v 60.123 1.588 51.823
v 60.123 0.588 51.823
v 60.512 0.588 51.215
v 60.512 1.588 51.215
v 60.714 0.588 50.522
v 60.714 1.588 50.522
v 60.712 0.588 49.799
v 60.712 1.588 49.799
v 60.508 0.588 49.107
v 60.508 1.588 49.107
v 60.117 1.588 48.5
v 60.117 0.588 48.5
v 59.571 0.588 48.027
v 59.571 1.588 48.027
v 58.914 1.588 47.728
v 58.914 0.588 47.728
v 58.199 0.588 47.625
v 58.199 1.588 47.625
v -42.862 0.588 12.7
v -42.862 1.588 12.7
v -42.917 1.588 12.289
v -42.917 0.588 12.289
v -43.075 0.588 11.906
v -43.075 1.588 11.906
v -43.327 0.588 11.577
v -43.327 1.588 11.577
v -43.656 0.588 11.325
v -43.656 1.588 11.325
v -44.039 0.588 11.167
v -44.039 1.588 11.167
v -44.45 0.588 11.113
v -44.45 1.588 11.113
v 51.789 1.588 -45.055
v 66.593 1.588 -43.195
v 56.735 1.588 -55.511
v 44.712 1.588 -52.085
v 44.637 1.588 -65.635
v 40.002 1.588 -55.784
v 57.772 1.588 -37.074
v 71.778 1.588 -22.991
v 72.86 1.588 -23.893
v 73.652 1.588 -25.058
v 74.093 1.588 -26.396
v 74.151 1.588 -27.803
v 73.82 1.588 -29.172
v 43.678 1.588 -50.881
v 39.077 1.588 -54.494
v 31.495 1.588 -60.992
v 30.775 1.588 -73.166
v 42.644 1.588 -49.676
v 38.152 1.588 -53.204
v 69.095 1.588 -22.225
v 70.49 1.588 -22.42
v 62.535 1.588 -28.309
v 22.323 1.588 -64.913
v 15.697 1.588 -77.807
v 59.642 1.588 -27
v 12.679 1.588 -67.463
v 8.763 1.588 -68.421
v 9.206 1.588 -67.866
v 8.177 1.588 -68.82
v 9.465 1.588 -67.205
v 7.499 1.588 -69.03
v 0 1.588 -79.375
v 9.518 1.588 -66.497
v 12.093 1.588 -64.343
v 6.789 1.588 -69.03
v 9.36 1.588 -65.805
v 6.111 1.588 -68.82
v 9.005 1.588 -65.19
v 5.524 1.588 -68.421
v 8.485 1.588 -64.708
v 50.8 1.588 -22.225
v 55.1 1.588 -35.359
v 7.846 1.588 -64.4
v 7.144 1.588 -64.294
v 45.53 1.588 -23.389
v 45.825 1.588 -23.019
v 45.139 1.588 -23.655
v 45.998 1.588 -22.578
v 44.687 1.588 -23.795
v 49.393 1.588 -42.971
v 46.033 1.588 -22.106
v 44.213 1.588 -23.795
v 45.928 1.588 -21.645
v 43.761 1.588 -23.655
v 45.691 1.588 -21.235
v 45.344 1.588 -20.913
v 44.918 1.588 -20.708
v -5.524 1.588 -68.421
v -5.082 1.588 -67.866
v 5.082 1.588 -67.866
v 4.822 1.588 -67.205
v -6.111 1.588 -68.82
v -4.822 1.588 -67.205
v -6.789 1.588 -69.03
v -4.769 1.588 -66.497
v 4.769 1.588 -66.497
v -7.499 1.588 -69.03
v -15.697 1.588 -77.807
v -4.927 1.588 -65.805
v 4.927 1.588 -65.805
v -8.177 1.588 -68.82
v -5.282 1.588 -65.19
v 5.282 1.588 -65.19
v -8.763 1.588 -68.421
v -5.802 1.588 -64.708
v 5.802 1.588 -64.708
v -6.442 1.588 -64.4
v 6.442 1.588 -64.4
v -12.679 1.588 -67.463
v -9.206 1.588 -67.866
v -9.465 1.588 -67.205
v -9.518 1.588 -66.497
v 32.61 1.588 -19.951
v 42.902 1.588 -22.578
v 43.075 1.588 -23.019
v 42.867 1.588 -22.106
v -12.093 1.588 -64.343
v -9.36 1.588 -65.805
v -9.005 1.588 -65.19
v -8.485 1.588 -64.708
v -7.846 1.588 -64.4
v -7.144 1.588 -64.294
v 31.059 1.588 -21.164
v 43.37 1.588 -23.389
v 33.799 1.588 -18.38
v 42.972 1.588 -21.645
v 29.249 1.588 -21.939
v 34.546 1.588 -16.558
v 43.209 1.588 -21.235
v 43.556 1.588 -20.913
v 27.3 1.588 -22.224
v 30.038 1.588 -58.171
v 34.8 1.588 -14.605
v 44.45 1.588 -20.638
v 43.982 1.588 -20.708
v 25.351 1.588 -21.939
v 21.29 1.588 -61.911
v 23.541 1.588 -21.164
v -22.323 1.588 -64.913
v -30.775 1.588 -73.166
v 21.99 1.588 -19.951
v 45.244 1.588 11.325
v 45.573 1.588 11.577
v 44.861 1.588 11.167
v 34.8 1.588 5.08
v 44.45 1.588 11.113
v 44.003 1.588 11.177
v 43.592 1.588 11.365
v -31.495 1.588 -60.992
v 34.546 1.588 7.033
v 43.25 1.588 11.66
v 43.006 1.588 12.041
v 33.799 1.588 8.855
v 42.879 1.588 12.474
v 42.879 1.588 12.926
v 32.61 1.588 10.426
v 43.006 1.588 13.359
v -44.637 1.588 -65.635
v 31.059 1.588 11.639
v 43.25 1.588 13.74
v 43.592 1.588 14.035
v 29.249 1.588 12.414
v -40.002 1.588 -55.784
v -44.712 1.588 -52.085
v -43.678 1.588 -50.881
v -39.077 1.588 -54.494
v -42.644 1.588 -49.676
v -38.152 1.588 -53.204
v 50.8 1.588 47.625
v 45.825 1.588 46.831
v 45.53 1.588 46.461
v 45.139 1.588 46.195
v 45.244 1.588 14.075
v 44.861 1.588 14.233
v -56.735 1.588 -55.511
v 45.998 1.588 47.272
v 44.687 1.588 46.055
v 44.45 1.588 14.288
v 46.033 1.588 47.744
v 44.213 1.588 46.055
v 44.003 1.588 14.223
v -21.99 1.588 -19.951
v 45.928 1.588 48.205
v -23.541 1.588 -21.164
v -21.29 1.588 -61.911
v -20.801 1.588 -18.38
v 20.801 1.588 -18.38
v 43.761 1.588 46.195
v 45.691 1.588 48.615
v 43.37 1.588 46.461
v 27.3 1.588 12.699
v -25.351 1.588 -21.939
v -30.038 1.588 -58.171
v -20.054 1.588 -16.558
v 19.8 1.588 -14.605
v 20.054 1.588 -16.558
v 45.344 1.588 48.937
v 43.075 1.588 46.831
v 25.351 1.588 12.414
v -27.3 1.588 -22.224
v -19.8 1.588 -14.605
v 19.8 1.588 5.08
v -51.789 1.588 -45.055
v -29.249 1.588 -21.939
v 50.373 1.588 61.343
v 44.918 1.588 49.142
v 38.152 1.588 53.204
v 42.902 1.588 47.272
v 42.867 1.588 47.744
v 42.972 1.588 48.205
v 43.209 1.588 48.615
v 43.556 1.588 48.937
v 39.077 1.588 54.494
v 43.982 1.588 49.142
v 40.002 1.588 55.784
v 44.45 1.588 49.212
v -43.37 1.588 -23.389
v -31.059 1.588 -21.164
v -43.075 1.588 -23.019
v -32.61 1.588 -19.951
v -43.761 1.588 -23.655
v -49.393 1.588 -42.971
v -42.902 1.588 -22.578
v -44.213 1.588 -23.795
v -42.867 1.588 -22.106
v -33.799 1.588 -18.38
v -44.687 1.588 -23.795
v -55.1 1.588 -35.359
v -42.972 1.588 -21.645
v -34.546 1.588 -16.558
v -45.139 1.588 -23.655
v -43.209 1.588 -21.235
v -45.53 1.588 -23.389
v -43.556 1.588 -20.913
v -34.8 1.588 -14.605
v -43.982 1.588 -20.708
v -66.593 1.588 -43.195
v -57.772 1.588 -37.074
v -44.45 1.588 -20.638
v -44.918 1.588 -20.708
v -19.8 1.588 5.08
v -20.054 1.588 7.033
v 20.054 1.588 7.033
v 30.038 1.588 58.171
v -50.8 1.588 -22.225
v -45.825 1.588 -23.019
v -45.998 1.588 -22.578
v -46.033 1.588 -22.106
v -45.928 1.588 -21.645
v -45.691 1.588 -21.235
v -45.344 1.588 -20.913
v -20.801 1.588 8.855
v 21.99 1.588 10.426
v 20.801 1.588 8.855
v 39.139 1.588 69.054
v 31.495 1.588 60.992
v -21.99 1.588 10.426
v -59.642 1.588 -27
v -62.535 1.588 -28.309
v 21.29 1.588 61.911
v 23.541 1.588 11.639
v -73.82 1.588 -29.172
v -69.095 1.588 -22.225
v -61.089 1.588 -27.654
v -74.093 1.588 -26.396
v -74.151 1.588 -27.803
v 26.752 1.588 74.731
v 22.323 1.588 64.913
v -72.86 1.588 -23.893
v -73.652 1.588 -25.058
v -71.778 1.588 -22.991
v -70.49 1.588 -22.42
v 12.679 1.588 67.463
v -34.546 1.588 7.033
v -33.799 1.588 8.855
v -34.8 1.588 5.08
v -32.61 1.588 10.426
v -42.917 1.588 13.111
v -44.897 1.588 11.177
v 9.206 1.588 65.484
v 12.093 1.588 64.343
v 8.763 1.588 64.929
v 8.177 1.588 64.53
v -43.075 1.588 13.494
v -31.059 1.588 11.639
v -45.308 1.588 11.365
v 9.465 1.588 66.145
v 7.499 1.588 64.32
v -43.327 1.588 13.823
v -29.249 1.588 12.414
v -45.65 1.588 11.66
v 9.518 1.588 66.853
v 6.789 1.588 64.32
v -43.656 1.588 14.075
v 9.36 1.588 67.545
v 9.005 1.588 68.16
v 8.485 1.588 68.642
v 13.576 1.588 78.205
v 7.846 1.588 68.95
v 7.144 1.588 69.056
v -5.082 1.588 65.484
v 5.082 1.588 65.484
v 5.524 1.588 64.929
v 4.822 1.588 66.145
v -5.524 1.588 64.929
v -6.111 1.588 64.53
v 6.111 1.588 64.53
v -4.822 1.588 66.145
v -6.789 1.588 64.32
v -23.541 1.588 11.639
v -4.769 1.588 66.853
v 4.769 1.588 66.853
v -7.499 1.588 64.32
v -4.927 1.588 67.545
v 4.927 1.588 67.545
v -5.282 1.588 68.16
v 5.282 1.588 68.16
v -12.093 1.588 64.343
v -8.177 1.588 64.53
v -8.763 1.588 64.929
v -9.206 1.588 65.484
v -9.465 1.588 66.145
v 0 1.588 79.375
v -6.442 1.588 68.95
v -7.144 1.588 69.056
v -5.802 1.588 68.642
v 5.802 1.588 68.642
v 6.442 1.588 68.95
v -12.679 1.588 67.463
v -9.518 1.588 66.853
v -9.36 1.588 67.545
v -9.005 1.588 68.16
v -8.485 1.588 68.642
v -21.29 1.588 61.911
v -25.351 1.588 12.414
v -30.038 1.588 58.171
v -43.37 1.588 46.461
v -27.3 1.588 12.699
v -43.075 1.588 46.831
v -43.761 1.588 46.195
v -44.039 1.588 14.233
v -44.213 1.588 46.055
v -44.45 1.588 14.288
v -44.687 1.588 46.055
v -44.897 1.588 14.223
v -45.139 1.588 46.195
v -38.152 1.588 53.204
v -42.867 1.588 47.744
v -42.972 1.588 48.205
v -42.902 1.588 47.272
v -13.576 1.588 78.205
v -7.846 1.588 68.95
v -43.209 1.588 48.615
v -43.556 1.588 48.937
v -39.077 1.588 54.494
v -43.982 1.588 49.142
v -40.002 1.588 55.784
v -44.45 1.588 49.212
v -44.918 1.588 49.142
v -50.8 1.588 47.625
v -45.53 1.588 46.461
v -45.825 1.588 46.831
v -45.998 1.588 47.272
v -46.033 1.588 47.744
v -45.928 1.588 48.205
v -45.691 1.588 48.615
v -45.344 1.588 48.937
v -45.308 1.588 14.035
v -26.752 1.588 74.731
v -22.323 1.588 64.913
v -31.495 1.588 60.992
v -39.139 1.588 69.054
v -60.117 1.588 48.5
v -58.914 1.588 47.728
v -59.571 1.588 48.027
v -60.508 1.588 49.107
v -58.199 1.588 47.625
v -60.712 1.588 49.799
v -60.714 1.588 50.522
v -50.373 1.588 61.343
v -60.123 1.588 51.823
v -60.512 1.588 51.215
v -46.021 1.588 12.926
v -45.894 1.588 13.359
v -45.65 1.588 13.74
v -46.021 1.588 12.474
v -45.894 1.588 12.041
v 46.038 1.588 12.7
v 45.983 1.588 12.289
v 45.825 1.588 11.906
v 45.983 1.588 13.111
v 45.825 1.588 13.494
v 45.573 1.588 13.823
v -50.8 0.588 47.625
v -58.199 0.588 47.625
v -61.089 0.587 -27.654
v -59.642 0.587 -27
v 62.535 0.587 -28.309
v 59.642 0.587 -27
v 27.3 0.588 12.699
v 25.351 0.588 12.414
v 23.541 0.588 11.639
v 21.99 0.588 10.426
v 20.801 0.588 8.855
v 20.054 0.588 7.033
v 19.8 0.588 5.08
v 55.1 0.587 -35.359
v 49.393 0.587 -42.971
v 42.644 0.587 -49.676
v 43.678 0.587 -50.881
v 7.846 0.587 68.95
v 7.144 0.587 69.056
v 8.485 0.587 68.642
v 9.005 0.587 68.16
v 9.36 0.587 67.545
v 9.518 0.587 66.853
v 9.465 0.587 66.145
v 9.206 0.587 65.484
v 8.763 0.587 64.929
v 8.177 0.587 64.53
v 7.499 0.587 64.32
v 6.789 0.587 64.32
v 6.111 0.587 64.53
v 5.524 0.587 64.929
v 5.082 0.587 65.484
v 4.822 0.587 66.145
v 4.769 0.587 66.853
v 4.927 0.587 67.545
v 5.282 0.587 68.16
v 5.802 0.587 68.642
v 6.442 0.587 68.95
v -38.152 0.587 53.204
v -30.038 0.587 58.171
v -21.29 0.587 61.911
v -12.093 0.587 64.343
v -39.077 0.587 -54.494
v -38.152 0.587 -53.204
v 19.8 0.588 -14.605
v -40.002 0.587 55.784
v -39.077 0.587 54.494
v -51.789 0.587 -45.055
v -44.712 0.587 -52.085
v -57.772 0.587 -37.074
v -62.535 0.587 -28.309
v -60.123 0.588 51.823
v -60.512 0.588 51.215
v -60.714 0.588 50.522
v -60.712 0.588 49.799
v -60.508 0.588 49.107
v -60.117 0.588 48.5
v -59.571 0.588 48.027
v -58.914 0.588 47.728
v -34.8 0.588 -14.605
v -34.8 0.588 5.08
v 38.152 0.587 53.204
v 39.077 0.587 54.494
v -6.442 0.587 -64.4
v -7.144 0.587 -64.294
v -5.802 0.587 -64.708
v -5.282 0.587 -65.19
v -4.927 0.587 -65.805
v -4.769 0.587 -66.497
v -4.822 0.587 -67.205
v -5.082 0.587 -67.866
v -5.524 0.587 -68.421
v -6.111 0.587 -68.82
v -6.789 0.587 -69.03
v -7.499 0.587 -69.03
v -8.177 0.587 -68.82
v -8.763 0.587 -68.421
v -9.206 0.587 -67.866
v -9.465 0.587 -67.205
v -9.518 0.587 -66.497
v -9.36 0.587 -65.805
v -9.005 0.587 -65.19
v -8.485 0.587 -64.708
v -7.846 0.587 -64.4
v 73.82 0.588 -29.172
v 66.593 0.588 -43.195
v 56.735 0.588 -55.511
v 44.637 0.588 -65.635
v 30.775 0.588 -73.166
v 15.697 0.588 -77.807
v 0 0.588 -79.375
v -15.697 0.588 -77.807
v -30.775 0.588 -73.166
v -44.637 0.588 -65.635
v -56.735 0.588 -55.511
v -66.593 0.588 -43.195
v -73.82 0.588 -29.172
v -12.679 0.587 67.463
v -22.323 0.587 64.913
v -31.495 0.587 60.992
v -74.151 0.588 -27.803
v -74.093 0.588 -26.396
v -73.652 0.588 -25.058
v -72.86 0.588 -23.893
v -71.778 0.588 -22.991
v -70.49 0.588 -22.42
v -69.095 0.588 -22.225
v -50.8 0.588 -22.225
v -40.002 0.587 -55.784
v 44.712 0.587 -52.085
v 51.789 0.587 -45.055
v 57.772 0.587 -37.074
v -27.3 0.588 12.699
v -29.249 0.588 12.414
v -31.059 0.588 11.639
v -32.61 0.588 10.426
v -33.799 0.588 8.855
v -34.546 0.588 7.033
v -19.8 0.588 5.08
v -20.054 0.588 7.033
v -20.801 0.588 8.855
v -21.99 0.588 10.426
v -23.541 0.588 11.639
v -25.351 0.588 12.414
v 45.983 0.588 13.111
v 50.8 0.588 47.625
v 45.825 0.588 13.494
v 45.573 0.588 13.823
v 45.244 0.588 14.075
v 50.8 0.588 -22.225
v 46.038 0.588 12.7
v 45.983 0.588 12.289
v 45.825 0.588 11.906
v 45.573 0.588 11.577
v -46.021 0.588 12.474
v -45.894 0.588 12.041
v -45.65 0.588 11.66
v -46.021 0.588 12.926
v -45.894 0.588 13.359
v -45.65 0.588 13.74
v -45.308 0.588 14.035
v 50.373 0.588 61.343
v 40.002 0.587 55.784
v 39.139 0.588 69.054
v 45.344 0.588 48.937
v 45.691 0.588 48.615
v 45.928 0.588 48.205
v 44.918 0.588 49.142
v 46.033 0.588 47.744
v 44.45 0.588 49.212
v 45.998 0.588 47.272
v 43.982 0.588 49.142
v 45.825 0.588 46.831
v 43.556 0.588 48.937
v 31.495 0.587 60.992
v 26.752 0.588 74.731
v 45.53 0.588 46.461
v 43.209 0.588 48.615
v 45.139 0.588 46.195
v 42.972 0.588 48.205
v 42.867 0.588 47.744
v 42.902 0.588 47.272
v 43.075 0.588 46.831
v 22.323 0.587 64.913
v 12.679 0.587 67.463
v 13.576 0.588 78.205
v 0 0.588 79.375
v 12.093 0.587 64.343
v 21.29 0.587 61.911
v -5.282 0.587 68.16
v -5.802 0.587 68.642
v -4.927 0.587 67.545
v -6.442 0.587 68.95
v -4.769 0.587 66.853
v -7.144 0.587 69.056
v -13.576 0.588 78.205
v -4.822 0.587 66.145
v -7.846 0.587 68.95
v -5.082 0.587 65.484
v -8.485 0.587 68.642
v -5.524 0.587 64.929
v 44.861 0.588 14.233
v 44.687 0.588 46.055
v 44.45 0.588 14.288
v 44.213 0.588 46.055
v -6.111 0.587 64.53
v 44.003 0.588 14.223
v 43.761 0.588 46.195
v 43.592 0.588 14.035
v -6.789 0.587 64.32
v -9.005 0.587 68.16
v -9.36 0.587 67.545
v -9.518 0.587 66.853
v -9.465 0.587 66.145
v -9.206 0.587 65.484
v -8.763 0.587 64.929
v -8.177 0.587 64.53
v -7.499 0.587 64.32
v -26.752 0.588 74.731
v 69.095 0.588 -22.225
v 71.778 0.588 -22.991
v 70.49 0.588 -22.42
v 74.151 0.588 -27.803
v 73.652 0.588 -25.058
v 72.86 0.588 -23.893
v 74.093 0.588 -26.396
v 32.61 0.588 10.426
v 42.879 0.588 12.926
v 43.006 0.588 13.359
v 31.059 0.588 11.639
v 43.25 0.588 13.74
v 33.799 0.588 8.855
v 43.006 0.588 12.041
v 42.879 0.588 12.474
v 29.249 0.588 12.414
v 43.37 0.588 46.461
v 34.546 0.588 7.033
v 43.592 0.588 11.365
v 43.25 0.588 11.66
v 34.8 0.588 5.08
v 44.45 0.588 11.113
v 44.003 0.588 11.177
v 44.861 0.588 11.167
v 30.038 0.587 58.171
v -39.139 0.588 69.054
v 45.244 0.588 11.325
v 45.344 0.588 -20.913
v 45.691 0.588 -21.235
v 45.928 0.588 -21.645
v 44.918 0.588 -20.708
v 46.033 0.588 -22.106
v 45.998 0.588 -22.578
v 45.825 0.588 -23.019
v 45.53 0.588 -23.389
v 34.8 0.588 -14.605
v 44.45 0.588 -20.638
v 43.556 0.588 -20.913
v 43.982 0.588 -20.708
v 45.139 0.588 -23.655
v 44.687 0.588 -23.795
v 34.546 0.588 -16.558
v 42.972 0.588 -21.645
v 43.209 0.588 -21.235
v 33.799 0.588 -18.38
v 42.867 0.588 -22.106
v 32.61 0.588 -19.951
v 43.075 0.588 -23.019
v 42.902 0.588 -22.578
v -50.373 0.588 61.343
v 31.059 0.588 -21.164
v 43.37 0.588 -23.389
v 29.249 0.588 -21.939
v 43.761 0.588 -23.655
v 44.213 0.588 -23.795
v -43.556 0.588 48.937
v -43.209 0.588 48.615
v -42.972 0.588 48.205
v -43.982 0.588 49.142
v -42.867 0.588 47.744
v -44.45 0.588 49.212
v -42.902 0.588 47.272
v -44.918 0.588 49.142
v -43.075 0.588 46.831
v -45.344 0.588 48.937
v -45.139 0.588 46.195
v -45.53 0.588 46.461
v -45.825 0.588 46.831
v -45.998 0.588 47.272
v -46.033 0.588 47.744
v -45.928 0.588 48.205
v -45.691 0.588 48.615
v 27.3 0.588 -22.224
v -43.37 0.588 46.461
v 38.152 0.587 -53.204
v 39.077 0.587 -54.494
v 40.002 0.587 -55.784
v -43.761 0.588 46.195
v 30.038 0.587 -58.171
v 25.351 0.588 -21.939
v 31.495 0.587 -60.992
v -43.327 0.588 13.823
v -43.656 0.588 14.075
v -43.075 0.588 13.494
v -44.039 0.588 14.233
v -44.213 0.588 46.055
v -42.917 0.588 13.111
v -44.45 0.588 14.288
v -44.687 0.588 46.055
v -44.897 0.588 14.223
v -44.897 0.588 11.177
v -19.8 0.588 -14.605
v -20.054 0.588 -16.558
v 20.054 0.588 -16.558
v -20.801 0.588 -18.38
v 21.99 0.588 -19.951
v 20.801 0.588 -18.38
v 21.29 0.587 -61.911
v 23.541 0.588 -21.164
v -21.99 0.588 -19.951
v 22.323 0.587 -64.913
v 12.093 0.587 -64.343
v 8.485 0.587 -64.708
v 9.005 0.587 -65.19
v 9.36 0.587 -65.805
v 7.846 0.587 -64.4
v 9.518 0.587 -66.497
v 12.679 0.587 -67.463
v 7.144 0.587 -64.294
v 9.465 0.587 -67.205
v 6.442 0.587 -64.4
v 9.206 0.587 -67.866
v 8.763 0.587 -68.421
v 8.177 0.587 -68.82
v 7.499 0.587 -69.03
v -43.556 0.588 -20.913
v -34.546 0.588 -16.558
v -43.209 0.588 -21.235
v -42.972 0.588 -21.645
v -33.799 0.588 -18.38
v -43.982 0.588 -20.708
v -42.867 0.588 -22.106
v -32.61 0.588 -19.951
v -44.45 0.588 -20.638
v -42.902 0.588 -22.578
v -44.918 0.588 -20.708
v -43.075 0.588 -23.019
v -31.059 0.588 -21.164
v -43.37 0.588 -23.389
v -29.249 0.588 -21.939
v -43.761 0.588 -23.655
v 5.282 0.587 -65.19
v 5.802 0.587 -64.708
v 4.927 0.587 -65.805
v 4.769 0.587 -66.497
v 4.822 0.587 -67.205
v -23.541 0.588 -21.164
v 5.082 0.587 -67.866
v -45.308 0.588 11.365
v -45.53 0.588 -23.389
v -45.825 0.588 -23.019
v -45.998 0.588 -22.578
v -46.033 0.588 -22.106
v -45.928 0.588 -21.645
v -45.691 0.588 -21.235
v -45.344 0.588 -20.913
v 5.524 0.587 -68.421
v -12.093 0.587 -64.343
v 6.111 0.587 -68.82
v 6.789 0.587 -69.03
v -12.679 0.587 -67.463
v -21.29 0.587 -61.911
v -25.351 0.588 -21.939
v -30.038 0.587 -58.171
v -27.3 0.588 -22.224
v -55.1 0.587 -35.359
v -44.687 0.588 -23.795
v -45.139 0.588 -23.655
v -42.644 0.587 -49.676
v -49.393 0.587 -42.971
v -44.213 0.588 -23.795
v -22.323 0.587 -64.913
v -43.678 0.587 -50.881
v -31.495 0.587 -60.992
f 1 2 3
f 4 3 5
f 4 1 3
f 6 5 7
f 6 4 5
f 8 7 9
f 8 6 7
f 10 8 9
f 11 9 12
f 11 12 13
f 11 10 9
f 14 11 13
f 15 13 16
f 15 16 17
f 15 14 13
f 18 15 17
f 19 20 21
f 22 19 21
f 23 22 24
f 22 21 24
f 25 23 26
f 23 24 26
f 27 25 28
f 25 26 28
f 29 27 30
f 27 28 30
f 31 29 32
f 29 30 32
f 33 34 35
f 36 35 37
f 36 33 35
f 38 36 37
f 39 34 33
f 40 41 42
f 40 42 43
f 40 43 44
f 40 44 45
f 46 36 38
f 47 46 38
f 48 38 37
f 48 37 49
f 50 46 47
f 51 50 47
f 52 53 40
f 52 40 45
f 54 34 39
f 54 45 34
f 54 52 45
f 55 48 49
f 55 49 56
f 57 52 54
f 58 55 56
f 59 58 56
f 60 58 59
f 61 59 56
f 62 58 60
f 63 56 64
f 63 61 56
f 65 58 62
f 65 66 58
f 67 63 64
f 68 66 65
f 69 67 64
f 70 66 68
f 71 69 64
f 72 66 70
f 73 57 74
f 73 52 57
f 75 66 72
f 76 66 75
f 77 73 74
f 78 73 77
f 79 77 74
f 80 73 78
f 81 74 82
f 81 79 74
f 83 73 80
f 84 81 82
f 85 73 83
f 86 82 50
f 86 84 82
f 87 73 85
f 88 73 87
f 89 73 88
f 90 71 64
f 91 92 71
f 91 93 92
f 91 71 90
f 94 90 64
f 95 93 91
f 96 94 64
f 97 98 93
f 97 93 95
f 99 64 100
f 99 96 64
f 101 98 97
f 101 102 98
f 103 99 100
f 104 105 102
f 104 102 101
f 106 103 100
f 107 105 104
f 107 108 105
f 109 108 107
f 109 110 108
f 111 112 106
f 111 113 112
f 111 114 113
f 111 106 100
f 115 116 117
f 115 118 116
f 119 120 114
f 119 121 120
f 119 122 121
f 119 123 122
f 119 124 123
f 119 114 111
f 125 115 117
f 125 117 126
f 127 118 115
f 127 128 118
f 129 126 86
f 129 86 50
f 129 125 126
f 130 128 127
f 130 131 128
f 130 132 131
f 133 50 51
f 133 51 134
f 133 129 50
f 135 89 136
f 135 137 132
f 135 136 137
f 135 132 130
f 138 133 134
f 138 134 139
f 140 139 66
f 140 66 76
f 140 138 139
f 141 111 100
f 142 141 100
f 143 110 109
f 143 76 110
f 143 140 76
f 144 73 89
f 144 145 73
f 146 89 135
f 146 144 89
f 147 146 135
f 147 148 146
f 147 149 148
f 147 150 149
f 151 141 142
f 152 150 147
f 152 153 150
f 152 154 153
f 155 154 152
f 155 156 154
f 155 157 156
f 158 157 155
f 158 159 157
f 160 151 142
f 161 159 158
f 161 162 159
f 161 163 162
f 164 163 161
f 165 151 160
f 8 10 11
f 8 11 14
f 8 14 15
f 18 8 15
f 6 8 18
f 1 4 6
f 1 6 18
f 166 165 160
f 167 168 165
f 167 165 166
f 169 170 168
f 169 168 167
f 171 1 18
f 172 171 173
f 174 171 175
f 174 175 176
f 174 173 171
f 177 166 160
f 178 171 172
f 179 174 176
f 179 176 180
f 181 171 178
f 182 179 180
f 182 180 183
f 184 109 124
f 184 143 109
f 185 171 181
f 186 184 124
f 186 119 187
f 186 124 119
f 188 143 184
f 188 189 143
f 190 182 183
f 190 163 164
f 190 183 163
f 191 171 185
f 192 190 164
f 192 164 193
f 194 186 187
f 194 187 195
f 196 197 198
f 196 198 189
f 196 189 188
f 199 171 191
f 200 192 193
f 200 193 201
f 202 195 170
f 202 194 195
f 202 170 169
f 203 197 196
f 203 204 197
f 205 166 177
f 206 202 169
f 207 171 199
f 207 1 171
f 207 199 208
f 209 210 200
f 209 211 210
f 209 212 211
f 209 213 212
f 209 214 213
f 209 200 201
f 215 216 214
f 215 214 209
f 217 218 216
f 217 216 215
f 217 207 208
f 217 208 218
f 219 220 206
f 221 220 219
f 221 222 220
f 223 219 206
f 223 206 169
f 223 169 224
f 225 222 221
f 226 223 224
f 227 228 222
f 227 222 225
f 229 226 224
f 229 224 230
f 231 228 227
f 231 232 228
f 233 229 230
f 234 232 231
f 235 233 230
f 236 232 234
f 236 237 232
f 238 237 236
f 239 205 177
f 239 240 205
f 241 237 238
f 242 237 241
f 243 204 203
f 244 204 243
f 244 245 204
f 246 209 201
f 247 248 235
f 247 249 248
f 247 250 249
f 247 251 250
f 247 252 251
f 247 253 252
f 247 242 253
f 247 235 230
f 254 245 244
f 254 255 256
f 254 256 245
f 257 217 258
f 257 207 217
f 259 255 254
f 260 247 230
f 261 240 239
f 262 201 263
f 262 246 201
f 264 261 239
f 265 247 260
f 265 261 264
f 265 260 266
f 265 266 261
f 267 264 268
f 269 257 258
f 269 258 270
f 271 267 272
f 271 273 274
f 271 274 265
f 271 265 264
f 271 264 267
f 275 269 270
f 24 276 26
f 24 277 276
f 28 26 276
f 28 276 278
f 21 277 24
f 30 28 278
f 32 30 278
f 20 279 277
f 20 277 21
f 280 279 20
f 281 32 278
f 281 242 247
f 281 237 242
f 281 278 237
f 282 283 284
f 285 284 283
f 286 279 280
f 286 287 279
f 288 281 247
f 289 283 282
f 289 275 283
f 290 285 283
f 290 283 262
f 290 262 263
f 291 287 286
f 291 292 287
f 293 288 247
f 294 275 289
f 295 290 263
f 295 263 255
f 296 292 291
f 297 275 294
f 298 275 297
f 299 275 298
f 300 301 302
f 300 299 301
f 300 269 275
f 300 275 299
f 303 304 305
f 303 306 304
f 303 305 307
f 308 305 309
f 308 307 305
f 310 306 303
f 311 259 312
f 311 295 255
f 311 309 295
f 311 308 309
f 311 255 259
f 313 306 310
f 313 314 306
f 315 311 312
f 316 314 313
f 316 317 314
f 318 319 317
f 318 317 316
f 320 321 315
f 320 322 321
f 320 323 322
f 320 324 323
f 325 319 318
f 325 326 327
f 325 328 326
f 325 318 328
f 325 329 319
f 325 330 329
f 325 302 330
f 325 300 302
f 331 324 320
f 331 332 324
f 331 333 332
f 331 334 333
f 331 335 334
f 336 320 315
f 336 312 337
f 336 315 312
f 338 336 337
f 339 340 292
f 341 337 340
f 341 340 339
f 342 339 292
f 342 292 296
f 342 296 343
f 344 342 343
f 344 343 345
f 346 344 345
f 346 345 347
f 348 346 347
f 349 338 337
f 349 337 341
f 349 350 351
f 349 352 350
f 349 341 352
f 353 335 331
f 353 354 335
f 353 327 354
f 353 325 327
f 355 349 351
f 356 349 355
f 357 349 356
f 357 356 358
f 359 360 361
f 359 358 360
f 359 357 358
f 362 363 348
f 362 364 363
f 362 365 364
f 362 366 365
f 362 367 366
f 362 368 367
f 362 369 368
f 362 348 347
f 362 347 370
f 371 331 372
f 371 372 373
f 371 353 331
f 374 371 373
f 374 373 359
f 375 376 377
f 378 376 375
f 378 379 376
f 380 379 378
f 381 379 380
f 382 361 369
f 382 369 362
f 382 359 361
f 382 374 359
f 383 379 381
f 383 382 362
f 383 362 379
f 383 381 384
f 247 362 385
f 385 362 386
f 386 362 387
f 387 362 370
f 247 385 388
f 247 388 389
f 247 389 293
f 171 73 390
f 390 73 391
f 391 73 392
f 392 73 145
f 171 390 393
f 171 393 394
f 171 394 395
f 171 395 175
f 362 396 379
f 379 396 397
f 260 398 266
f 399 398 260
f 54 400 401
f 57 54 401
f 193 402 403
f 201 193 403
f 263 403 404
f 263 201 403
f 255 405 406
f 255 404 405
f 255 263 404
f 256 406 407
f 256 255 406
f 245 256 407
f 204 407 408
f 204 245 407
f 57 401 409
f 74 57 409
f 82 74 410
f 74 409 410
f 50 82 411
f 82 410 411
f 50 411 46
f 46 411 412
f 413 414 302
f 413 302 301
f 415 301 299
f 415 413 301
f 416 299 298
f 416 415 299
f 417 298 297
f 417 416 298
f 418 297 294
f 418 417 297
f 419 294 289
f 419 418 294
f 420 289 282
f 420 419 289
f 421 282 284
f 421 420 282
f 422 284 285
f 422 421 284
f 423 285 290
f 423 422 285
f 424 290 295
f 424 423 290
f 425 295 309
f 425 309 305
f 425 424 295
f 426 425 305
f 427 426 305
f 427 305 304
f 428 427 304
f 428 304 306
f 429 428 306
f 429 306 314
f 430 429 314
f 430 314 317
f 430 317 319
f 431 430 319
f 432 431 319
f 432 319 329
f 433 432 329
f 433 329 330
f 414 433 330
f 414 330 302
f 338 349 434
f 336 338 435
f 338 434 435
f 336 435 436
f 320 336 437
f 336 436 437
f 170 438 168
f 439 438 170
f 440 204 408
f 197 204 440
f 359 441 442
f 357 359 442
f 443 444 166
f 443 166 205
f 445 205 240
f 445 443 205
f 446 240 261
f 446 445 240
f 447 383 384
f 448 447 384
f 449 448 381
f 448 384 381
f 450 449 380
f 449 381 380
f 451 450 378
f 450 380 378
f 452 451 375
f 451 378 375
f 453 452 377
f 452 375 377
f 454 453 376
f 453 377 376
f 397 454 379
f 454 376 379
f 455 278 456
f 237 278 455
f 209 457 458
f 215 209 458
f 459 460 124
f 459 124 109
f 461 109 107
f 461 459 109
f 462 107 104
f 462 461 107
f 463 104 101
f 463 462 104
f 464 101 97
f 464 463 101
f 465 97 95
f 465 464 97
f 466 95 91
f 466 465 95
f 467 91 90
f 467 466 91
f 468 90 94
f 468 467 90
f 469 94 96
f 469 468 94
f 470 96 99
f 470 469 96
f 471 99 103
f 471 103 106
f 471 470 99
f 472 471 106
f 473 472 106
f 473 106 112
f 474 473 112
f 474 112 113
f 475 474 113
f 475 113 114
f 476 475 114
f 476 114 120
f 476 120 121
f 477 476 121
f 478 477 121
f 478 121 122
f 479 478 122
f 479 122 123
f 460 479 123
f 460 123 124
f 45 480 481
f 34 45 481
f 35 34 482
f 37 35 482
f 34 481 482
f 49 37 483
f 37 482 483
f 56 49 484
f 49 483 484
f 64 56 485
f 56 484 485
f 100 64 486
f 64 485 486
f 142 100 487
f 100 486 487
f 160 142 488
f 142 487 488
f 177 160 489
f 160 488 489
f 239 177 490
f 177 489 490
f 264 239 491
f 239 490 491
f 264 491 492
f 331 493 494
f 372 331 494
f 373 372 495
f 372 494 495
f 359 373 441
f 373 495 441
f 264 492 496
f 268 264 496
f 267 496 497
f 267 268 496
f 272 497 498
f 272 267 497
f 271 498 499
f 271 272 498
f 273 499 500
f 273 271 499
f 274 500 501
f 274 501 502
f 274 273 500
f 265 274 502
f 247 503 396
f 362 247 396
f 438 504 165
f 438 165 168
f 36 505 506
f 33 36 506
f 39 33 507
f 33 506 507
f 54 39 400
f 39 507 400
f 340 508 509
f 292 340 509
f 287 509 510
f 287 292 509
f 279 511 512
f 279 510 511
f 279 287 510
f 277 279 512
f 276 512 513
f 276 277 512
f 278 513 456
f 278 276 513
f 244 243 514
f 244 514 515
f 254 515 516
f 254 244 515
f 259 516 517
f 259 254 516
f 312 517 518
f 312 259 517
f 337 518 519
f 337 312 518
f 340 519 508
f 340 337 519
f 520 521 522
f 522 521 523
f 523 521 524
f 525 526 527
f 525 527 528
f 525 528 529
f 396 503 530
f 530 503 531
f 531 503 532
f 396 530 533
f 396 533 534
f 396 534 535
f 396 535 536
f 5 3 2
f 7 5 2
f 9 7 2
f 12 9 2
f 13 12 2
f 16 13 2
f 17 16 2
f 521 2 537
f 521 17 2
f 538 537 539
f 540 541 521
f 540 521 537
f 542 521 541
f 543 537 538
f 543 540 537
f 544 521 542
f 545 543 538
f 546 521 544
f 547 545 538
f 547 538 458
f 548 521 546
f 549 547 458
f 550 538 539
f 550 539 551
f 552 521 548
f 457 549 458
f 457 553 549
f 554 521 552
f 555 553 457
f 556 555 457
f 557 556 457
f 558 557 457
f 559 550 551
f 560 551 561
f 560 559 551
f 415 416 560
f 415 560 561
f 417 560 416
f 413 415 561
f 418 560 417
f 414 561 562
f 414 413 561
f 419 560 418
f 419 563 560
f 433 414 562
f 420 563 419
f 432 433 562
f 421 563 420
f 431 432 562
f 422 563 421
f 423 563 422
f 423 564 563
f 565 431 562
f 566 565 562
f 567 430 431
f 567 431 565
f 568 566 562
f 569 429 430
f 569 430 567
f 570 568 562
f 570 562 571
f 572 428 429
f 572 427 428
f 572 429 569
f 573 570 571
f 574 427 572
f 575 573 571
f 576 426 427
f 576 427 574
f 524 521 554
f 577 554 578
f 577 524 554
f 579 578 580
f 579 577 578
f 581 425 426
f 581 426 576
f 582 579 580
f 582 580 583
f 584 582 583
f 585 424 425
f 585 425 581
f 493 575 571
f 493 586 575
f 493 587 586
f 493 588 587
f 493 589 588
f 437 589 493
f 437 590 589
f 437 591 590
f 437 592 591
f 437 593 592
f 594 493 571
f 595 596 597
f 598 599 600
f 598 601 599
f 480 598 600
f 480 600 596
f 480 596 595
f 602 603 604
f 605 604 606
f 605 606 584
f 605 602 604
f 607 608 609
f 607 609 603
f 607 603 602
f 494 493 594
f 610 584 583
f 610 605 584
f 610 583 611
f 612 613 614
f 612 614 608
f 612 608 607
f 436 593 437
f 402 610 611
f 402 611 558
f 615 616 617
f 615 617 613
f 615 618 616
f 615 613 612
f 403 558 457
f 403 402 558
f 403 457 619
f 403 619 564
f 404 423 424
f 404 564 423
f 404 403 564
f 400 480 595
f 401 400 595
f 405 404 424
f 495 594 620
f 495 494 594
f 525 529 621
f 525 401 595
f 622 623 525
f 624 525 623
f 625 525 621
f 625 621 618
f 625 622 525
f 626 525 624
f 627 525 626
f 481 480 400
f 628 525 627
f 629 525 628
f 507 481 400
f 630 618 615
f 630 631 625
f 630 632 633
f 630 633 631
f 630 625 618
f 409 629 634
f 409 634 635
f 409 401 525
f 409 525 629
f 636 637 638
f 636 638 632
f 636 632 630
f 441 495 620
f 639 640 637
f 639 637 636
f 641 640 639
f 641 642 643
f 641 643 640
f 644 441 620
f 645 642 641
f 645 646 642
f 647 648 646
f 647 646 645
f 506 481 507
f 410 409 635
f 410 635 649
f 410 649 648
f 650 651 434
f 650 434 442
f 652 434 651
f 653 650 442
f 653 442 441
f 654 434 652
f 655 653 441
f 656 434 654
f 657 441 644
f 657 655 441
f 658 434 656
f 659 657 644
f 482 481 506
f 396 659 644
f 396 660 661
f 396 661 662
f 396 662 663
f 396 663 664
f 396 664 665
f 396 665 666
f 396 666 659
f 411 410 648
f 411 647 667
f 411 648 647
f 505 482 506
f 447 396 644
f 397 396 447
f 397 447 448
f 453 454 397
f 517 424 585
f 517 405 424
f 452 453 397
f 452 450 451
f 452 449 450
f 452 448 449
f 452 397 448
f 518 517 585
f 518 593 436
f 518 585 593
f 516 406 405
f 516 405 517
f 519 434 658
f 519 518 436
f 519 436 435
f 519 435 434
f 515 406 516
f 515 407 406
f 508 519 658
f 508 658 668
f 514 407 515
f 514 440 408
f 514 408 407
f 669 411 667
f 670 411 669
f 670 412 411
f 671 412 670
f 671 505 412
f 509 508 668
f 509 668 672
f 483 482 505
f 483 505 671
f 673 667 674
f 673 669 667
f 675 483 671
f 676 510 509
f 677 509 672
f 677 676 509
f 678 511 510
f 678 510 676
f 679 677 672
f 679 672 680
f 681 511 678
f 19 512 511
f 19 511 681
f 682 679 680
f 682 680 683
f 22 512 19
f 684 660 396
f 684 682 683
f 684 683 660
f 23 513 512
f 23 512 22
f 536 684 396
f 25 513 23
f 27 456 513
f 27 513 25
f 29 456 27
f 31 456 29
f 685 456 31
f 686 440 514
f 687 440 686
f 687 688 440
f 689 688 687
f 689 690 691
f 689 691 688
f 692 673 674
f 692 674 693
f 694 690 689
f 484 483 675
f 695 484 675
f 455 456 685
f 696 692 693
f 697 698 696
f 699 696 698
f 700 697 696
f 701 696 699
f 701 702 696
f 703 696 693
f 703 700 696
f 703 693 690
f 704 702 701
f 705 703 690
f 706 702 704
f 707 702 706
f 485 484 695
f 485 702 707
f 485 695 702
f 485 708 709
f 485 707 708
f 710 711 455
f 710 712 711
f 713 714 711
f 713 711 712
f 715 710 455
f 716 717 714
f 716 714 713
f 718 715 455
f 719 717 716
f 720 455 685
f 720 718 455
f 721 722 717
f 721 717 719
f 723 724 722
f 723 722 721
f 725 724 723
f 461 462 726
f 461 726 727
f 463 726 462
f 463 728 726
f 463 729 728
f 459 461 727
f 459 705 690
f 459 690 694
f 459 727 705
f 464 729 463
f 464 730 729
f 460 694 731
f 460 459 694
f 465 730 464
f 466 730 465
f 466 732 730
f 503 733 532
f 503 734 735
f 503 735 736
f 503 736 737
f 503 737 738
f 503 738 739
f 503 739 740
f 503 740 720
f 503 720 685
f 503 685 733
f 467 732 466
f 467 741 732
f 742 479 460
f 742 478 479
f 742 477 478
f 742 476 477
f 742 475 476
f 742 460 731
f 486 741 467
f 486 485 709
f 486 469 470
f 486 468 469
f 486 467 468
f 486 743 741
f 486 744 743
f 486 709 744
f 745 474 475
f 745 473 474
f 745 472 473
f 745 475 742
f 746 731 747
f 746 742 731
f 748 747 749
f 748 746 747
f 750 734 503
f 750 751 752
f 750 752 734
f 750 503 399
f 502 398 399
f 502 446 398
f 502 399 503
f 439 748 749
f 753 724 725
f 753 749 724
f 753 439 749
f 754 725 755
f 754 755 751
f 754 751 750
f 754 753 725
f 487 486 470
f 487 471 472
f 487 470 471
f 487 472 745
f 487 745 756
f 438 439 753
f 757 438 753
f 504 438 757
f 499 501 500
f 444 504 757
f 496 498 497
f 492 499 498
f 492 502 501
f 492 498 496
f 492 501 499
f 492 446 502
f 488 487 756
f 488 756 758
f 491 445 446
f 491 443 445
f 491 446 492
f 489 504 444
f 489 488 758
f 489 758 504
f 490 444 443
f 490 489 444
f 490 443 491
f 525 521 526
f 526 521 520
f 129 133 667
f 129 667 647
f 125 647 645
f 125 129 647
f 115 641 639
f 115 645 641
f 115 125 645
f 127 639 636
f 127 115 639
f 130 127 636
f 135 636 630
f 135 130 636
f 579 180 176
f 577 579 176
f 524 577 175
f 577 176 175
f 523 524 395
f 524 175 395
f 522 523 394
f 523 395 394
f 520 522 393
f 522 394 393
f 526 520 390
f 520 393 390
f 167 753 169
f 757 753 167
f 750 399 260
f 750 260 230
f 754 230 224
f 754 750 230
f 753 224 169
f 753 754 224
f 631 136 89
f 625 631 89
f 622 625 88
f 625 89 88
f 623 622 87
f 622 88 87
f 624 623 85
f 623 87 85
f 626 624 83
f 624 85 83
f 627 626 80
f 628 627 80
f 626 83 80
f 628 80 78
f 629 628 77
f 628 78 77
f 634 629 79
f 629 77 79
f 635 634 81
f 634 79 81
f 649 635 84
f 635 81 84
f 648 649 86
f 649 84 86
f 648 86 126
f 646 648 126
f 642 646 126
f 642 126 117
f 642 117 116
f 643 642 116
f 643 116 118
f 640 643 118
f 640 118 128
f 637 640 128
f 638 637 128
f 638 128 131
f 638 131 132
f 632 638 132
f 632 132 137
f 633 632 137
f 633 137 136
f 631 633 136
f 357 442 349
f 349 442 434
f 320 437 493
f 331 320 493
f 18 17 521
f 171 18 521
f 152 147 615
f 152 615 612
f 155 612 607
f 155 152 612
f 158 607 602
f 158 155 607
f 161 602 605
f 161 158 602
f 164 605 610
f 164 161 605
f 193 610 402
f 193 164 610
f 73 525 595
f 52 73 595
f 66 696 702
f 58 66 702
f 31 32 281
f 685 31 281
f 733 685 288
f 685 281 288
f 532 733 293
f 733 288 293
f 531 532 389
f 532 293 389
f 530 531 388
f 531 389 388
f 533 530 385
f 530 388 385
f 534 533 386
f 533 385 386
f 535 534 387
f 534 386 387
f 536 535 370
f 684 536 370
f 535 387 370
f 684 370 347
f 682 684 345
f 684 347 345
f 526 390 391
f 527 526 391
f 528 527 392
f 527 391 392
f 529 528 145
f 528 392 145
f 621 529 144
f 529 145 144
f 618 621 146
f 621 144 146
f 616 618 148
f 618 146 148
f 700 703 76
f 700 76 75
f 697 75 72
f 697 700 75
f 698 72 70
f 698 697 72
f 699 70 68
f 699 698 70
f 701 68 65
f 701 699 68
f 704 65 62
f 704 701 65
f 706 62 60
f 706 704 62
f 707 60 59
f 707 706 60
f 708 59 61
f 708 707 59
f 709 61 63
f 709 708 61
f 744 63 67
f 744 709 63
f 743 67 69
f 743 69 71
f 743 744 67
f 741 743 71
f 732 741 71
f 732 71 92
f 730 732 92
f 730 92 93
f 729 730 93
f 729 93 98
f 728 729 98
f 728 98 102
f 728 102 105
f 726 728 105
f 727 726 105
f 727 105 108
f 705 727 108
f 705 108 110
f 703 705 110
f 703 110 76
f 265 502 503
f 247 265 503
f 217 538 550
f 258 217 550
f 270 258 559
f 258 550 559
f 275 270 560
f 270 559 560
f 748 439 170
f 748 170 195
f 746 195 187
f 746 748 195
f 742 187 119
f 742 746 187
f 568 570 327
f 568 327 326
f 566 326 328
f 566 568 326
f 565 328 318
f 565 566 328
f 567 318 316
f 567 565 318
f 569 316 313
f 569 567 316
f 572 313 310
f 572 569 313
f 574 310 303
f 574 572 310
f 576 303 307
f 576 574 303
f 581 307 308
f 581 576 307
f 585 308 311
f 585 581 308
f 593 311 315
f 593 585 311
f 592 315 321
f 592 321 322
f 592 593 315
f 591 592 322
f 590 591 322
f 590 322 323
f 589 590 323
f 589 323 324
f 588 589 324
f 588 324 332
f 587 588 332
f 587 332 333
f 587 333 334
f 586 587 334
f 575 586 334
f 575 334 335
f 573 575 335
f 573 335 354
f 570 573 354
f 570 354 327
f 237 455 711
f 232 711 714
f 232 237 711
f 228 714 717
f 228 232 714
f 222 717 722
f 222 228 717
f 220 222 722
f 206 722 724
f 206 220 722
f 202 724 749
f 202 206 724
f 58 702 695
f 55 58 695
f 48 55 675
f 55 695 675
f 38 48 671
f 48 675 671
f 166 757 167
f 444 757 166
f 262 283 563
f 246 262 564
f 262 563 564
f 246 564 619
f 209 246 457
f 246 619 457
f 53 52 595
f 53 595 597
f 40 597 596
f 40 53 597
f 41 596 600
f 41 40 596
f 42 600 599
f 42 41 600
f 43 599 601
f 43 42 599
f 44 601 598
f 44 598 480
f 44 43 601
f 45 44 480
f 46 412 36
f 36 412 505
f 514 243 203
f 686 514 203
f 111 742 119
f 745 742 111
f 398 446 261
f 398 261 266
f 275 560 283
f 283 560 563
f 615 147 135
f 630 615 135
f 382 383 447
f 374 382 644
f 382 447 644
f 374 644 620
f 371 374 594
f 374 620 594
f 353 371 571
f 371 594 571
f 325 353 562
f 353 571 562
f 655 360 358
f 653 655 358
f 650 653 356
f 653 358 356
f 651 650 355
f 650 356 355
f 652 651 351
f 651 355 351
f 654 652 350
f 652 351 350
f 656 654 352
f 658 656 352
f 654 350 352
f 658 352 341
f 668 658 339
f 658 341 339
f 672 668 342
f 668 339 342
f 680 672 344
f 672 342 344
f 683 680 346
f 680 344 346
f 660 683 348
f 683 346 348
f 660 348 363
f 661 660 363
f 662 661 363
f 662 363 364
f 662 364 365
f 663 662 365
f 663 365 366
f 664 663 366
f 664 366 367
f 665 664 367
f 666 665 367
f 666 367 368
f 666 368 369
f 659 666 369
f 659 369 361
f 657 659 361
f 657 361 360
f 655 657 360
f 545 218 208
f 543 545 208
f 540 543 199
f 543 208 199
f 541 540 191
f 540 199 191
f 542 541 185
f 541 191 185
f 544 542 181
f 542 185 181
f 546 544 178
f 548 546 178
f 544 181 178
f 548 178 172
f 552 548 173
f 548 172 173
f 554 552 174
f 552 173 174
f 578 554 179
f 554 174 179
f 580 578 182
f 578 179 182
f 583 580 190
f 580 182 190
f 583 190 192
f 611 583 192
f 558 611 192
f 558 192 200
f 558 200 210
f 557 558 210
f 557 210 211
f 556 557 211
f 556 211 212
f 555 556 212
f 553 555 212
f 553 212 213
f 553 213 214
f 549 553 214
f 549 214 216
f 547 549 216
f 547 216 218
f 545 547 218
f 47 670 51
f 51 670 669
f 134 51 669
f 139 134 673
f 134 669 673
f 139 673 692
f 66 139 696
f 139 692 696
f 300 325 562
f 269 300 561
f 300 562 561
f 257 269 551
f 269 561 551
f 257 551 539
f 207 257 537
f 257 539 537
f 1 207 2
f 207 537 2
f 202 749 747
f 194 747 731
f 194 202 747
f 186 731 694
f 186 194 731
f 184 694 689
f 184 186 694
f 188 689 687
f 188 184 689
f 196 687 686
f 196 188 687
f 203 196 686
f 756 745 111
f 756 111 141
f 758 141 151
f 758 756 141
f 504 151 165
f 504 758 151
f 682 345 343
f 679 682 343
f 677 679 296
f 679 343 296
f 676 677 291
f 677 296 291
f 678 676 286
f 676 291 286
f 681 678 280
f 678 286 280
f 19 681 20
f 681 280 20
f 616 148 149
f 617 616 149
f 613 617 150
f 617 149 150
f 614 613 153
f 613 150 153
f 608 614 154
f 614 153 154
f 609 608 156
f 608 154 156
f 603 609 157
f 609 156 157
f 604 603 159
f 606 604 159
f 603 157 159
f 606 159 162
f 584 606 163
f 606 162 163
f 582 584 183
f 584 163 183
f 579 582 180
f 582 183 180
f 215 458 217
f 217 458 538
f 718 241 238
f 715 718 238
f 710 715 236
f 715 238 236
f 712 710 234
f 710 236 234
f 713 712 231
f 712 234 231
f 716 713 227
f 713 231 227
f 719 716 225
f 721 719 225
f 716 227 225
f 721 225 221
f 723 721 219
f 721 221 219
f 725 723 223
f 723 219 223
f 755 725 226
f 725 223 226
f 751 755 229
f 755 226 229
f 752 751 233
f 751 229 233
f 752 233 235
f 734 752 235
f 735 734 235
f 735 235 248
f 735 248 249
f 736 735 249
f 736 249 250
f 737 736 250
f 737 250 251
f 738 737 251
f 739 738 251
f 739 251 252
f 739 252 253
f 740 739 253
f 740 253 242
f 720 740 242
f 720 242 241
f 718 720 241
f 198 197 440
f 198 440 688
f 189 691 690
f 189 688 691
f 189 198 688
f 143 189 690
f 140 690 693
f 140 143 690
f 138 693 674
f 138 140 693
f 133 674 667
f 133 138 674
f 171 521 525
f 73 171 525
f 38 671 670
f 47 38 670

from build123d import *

# Parameters (mm, degrees)
SKETCH1_R           = 1.5875
BOSS_EXTRUDE5_DEPTH = 1.5875
FILLET2_R           = 2.54
FILLET3_R           = 2.54
FILLET4_R           = 5.08
CUT_EXTRUDE1_START  = -2.54
SKETCH2_R           = 2.38125
SKETCH2_R_2         = 1.5875
CUT_EXTRUDE1_DEPTH  = 2.54
SKETCH3_R           = 1.5875
CUT_EXTRUDE2_DEPTH  = 2.54
CUT_EXTRUDE3_DEPTH  = 2.54
SKETCH5_W           = 15
SKETCH5_H           = 34.925
CUT_EXTRUDE4_DEPTH  = 109.650407999
FILLET5_R           = 7.62
FILLET6_R           = 7.62
SKETCH6_R           = 79.375
CUT_EXTRUDE5_DEPTH  = 0.5875


with BuildPart() as part:
    # Sketch1 → Boss-Extrude5 (new body)
    with BuildSketch(Plane(origin=(0, 0, 0), x_dir=(1, 0, 0), z_dir=(0, 1, 0))):
        with BuildLine():
            ThreePointArc((-63.5, -47.625), (-35.497579143, -70.995158286), (0, -79.375))
            ThreePointArc((0, -79.375), (35.497579143, -70.995158286), (63.5, -47.625))
            Line((63.5, -47.625), (50.8, -47.625))
            Line((50.8, -47.625), (50.8, 22.225))
            Line((50.8, 22.225), (76.2, 22.225))
            ThreePointArc((76.2, 22.225), (0, 79.375), (-76.2, 22.225))
            Line((-76.2, 22.225), (-50.8, 22.225))
            Line((-50.8, 22.225), (-50.8, -47.625))
            Line((-50.8, -47.625), (-63.5, -47.625))
        make_face()
        with Locations(Location((-7.14375, -66.675, 0), (0, 0, 270))):
            Circle(SKETCH1_R, mode=Mode.SUBTRACT)
        with BuildLine():
            ThreePointArc((8.73125, -66.675), (7.14375, -68.2625), (5.55625, -66.675))
            ThreePointArc((5.55625, -66.675), (7.14375, -65.0875), (8.73125, -66.675))
        make_face(mode=Mode.SUBTRACT)
        with Locations(Location((-7.14375, 66.675, 0), (0, 0, 270))):
            Circle(SKETCH1_R, mode=Mode.SUBTRACT)
        with Locations(Location((7.14375, 66.675, 0), (0, 0, 270))):
            Circle(SKETCH1_R, mode=Mode.SUBTRACT)
    extrude(amount=BOSS_EXTRUDE5_DEPTH)

    # Fillet2
    fillet2_edges = [part.edges().sort_by_distance(p)[0] for p in [
        (-63.5, 0.79375, 47.625),
    ]]
    fillet(fillet2_edges, radius=FILLET2_R)

    # Fillet3
    fillet3_edges = [part.edges().sort_by_distance(p)[0] for p in [
        (63.5, 0.79375, 47.625),
    ]]
    fillet(fillet3_edges, radius=FILLET3_R)

    # Fillet4
    fillet4_edges = [part.edges().sort_by_distance(p)[0] for p in [
        (-76.2, 0.79375, -22.225),
        (76.2, 0.79375, -22.225),
    ]]
    fillet(fillet4_edges, radius=FILLET4_R)

    # Sketch2 → Cut-Extrude1 (cut)
    # profile 1 of 10: a face of its own
    with BuildSketch(Plane(origin=(0, 1.5875, 0), x_dir=(1, 0, 0), z_dir=(0, 1, 0)).offset(CUT_EXTRUDE1_START)):
        with BuildLine():
            Line((-61.088622125, 27.654457796), (-59.642408406, 26.999765402))
            ThreePointArc((-59.642408406, 26.999765402), (-52.384826382, 39.268743005), (-42.643785254, 49.676068599))
            Line((-42.643785254, 49.676068599), (-43.677815048, 50.880617741))
            Line((-43.677815048, 50.880617741), (-44.711844841, 52.085166883))
            ThreePointArc((-44.711844841, 52.085166883), (-54.925289002, 41.173126022), (-62.534835843, 28.309150189))
            Line((-62.534835843, 28.309150189), (-61.088622125, 27.654457796))
        make_face()
    # profile 2 of 10: a face of its own
    with BuildSketch(Plane(origin=(0, 1.5875, 0), x_dir=(1, 0, 0), z_dir=(0, 1, 0)).offset(CUT_EXTRUDE1_START)):
        with BuildLine():
            Line((-39.077069744, 54.493774041), (-38.151958122, 53.203686937))
            ThreePointArc((-38.151958122, 53.203686937), (-25.732218917, 60.200142208), (-12.092567045, 64.342629994))
            Line((-12.092567045, 64.342629994), (-12.385788543, 65.902815048))
            Line((-12.385788543, 65.902815048), (-12.679010041, 67.463000102))
            ThreePointArc((-12.679010041, 67.463000102), (-26.980132574, 63.119617589), (-40.002181367, 55.783861145))
            Line((-40.002181367, 55.783861145), (-39.077069744, 54.493774041))
        make_face()
    # profile 3 of 10: a face of its own
    with BuildSketch(Plane(origin=(0, 1.5875, 0), x_dir=(1, 0, 0), z_dir=(0, 1, 0)).offset(CUT_EXTRUDE1_START)):
        with Locations(Location((-7.14375, 66.675, 0), (0, 0, 270))):
            Circle(SKETCH2_R)
        with Locations((-7.14375, 66.675)):
            Circle(SKETCH2_R_2, mode=Mode.SUBTRACT)
    # profile 4 of 10: a face of its own
    with BuildSketch(Plane(origin=(0, 1.5875, 0), x_dir=(1, 0, 0), z_dir=(0, 1, 0)).offset(CUT_EXTRUDE1_START)):
        with Locations(Location((7.14375, 66.675, 0), (0, 0, 270))):
            Circle(SKETCH2_R)
        with Locations((7.14375, 66.675)):
            Circle(SKETCH2_R_2, mode=Mode.SUBTRACT)
    # profile 5 of 10: a face of its own
    with BuildSketch(Plane(origin=(0, 1.5875, 0), x_dir=(1, 0, 0), z_dir=(0, 1, 0)).offset(CUT_EXTRUDE1_START)):
        with BuildLine():
            ThreePointArc((12.679010041, 67.463000102), (26.980132574, 63.119617589), (40.002181367, 55.783861145))
            Line((40.002181367, 55.783861145), (39.077069744, 54.493774041))
            Line((39.077069744, 54.493774041), (38.151958122, 53.203686937))
            ThreePointArc((38.151958122, 53.203686937), (25.732218917, 60.200142208), (12.092567045, 64.342629994))
            Line((12.092567045, 64.342629994), (12.385788543, 65.902815048))
            Line((12.385788543, 65.902815048), (12.679010041, 67.463000102))
        make_face()
    # profile 6 of 10: a face of its own
    with BuildSketch(Plane(origin=(0, 1.5875, 0), x_dir=(1, 0, 0), z_dir=(0, 1, 0)).offset(CUT_EXTRUDE1_START)):
        with BuildLine():
            ThreePointArc((44.711844841, 52.085166883), (54.925289002, 41.173126022), (62.534835843, 28.309150189))
            Line((62.534835843, 28.309150189), (59.642408406, 26.999765402))
            ThreePointArc((59.642408406, 26.999765402), (52.384826382, 39.268743005), (42.643785254, 49.676068599))
            Line((42.643785254, 49.676068599), (43.677815048, 50.880617741))
            Line((43.677815048, 50.880617741), (44.711844841, 52.085166883))
        make_face()
    # profile 7 of 10: a face of its own
    with BuildSketch(Plane(origin=(0, 1.5875, 0), x_dir=(1, 0, 0), z_dir=(0, 1, 0)).offset(CUT_EXTRUDE1_START)):
        with BuildLine():
            ThreePointArc((-12.679010041, -67.463000102), (-26.980132574, -63.119617589), (-40.002181367, -55.783861145))
            Line((-40.002181367, -55.783861145), (-39.077069744, -54.493774041))
            Line((-39.077069744, -54.493774041), (-38.151958122, -53.203686937))
            ThreePointArc((-38.151958122, -53.203686937), (-25.732218917, -60.200142208), (-12.092567045, -64.342629994))
            Line((-12.092567045, -64.342629994), (-12.385788543, -65.902815048))
            Line((-12.385788543, -65.902815048), (-12.679010041, -67.463000102))
        make_face()
    # profile 8 of 10: a face of its own
    with BuildSketch(Plane(origin=(0, 1.5875, 0), x_dir=(1, 0, 0), z_dir=(0, 1, 0)).offset(CUT_EXTRUDE1_START)):
        with Locations(Location((-7.14375, -66.675, 0), (0, 0, 270))):
            Circle(SKETCH2_R)
        with Locations((-7.14375, -66.675)):
            Circle(SKETCH2_R_2, mode=Mode.SUBTRACT)
    # profile 9 of 10: a face of its own
    with BuildSketch(Plane(origin=(0, 1.5875, 0), x_dir=(1, 0, 0), z_dir=(0, 1, 0)).offset(CUT_EXTRUDE1_START)):
        with Locations(Location((7.14375, -66.675, 0), (0, 0, 270))):
            Circle(SKETCH2_R)
        with Locations((7.14375, -66.675)):
            Circle(SKETCH2_R_2, mode=Mode.SUBTRACT)
    # profile 10 of 10: a face of its own
    with BuildSketch(Plane(origin=(0, 1.5875, 0), x_dir=(1, 0, 0), z_dir=(0, 1, 0)).offset(CUT_EXTRUDE1_START)):
        with BuildLine():
            ThreePointArc((12.092567045, -64.342629994), (25.732218917, -60.200142208), (38.151958122, -53.203686937))
            Line((38.151958122, -53.203686937), (39.077069744, -54.493774041))
            Line((39.077069744, -54.493774041), (40.002181367, -55.783861145))
            ThreePointArc((40.002181367, -55.783861145), (26.980132574, -63.119617589), (12.679010041, -67.463000102))
            Line((12.679010041, -67.463000102), (12.385788543, -65.902815048))
            Line((12.385788543, -65.902815048), (12.092567045, -64.342629994))
        make_face()
    extrude(amount=CUT_EXTRUDE1_DEPTH, mode=Mode.SUBTRACT)

    # Sketch3 → Cut-Extrude2 (cut)
    with BuildSketch(Plane(origin=(0, 1.5875, 0), x_dir=(1, 0, 0), z_dir=(0, 1, 0))):
        with Locations(Location((-44.45, -47.625, 0), (0, 0, 270))):
            Circle(SKETCH3_R)
        with Locations(Location((-44.45, 22.225, 0), (0, 0, 270))):
            Circle(SKETCH3_R)
        with Locations(Location((44.45, 22.225, 0), (0, 0, 270))):
            Circle(SKETCH3_R)
        with Locations(Location((44.45, -47.625, 0), (0, 0, 270))):
            Circle(SKETCH3_R)
    extrude(amount=-CUT_EXTRUDE2_DEPTH, mode=Mode.SUBTRACT)

    # Sketch4 → Cut-Extrude3 (cut)
    with BuildSketch(Plane(origin=(0, 1.5875, 0), x_dir=(1, 0, 0), z_dir=(0, 1, 0))):
        with BuildLine():
            ThreePointArc((-44.45, -11.1125), (-46.0375, -12.7), (-44.45, -14.2875))
            Line((-44.45, -14.2875), (-44.45, -11.1125))
        make_face()
        with BuildLine():
            Line((-44.45, -11.1125), (-44.45, -14.2875))
            ThreePointArc((-44.45, -14.2875), (-43.327467985, -13.822532015), (-42.8625, -12.7))
            ThreePointArc((-42.8625, -12.7), (-43.327467985, -11.577467985), (-44.45, -11.1125))
        make_face()
        with BuildLine():
            ThreePointArc((44.45, -11.1125), (42.8625, -12.7), (44.45, -14.2875))
            Line((44.45, -14.2875), (44.45, -11.1125))
        make_face()
        with BuildLine():
            Line((44.45, -11.1125), (44.45, -14.2875))
            ThreePointArc((44.45, -14.2875), (45.572532015, -13.822532015), (46.0375, -12.7))
            ThreePointArc((46.0375, -12.7), (45.572532015, -11.577467985), (44.45, -11.1125))
        make_face()
    extrude(amount=-CUT_EXTRUDE3_DEPTH, mode=Mode.SUBTRACT)

    # Sketch5 → Cut-Extrude4 (cut, through all)
    with BuildSketch(Plane(origin=(0, 1.5875, 0), x_dir=(1, 0, 0), z_dir=(0, 1, 0))):
        with Locations((-27.3, 4.7625)):
            Rectangle(SKETCH5_W, SKETCH5_H)
        with Locations((27.3, 4.7625)):
            Rectangle(SKETCH5_W, SKETCH5_H)
    extrude(amount=-CUT_EXTRUDE4_DEPTH, mode=Mode.SUBTRACT)

    # Fillet5
    # the kernel refuses this fillet: 7.62 mm, written as the material it adds along each edge
    with BuildSketch(Plane(origin=(-19.8, 1.5875, 12.7), x_dir=(0, 0, -1), z_dir=(0, -1, 0))) as fillet5_piece_1:
        with BuildLine():
            CenterArc((FILLET5_R, -FILLET5_R), FILLET5_R, 90, 90)
            Line((0, -FILLET5_R), (0, 0))
            Line((0, 0), (FILLET5_R, 0))
        make_face()
    extrude(amount=1.5875)
    with BuildSketch(Plane(origin=(-34.8, 1.5875, 12.7), x_dir=(0, 0, -1), z_dir=(0, -1, 0)), Plane(origin=(-19.8, 1.5875, -22.225), x_dir=(0, 0, 1), z_dir=(0, -1, 0)), Plane(origin=(-34.8, 1.5875, -22.225), x_dir=(1, 0, 0), z_dir=(0, -1, 0))) as fillet5_piece_2:
        with BuildLine():
            CenterArc((FILLET5_R, FILLET5_R), FILLET5_R, 180, 90)
            Line((0, FILLET5_R), (0, 0))
            Line((0, 0), (FILLET5_R, 0))
        make_face()
    extrude(amount=1.5875)

    # Fillet6
    # the kernel refuses this fillet: 7.62 mm, written as the material it adds along each edge
    with BuildSketch(Plane(origin=(34.8, 1.5875, 12.7), x_dir=(0, 0, -1), z_dir=(0, -1, 0)), Plane(origin=(34.8, 1.5875, -22.225), x_dir=(-1, 0, 0), z_dir=(0, -1, 0))) as fillet6_piece_1:
        with BuildLine():
            CenterArc((FILLET6_R, -FILLET6_R), FILLET6_R, 90, 90)
            Line((0, -FILLET6_R), (0, 0))
            Line((0, 0), (FILLET6_R, 0))
        make_face()
    extrude(amount=1.5875)
    with BuildSketch(Plane(origin=(19.8, 1.5875, -22.225), x_dir=(1, 0, 0), z_dir=(0, -1, 0)), Plane(origin=(19.8, 1.5875, 12.7), x_dir=(0, 0, -1), z_dir=(0, -1, 0))) as fillet6_piece_2:
        with BuildLine():
            CenterArc((FILLET6_R, FILLET6_R), FILLET6_R, 180, 90)
            Line((0, FILLET6_R), (0, 0))
            Line((0, 0), (FILLET6_R, 0))
        make_face()
    extrude(amount=1.5875)

    # Sketch6 → Cut-Extrude5 (cut)
    with BuildSketch(Plane(origin=(0, 0, 0), x_dir=(-1, 0, 0), z_dir=(0, -1, 0))):
        Circle(SKETCH6_R)
    extrude(amount=-CUT_EXTRUDE5_DEPTH, mode=Mode.SUBTRACT)


solid = part.part
